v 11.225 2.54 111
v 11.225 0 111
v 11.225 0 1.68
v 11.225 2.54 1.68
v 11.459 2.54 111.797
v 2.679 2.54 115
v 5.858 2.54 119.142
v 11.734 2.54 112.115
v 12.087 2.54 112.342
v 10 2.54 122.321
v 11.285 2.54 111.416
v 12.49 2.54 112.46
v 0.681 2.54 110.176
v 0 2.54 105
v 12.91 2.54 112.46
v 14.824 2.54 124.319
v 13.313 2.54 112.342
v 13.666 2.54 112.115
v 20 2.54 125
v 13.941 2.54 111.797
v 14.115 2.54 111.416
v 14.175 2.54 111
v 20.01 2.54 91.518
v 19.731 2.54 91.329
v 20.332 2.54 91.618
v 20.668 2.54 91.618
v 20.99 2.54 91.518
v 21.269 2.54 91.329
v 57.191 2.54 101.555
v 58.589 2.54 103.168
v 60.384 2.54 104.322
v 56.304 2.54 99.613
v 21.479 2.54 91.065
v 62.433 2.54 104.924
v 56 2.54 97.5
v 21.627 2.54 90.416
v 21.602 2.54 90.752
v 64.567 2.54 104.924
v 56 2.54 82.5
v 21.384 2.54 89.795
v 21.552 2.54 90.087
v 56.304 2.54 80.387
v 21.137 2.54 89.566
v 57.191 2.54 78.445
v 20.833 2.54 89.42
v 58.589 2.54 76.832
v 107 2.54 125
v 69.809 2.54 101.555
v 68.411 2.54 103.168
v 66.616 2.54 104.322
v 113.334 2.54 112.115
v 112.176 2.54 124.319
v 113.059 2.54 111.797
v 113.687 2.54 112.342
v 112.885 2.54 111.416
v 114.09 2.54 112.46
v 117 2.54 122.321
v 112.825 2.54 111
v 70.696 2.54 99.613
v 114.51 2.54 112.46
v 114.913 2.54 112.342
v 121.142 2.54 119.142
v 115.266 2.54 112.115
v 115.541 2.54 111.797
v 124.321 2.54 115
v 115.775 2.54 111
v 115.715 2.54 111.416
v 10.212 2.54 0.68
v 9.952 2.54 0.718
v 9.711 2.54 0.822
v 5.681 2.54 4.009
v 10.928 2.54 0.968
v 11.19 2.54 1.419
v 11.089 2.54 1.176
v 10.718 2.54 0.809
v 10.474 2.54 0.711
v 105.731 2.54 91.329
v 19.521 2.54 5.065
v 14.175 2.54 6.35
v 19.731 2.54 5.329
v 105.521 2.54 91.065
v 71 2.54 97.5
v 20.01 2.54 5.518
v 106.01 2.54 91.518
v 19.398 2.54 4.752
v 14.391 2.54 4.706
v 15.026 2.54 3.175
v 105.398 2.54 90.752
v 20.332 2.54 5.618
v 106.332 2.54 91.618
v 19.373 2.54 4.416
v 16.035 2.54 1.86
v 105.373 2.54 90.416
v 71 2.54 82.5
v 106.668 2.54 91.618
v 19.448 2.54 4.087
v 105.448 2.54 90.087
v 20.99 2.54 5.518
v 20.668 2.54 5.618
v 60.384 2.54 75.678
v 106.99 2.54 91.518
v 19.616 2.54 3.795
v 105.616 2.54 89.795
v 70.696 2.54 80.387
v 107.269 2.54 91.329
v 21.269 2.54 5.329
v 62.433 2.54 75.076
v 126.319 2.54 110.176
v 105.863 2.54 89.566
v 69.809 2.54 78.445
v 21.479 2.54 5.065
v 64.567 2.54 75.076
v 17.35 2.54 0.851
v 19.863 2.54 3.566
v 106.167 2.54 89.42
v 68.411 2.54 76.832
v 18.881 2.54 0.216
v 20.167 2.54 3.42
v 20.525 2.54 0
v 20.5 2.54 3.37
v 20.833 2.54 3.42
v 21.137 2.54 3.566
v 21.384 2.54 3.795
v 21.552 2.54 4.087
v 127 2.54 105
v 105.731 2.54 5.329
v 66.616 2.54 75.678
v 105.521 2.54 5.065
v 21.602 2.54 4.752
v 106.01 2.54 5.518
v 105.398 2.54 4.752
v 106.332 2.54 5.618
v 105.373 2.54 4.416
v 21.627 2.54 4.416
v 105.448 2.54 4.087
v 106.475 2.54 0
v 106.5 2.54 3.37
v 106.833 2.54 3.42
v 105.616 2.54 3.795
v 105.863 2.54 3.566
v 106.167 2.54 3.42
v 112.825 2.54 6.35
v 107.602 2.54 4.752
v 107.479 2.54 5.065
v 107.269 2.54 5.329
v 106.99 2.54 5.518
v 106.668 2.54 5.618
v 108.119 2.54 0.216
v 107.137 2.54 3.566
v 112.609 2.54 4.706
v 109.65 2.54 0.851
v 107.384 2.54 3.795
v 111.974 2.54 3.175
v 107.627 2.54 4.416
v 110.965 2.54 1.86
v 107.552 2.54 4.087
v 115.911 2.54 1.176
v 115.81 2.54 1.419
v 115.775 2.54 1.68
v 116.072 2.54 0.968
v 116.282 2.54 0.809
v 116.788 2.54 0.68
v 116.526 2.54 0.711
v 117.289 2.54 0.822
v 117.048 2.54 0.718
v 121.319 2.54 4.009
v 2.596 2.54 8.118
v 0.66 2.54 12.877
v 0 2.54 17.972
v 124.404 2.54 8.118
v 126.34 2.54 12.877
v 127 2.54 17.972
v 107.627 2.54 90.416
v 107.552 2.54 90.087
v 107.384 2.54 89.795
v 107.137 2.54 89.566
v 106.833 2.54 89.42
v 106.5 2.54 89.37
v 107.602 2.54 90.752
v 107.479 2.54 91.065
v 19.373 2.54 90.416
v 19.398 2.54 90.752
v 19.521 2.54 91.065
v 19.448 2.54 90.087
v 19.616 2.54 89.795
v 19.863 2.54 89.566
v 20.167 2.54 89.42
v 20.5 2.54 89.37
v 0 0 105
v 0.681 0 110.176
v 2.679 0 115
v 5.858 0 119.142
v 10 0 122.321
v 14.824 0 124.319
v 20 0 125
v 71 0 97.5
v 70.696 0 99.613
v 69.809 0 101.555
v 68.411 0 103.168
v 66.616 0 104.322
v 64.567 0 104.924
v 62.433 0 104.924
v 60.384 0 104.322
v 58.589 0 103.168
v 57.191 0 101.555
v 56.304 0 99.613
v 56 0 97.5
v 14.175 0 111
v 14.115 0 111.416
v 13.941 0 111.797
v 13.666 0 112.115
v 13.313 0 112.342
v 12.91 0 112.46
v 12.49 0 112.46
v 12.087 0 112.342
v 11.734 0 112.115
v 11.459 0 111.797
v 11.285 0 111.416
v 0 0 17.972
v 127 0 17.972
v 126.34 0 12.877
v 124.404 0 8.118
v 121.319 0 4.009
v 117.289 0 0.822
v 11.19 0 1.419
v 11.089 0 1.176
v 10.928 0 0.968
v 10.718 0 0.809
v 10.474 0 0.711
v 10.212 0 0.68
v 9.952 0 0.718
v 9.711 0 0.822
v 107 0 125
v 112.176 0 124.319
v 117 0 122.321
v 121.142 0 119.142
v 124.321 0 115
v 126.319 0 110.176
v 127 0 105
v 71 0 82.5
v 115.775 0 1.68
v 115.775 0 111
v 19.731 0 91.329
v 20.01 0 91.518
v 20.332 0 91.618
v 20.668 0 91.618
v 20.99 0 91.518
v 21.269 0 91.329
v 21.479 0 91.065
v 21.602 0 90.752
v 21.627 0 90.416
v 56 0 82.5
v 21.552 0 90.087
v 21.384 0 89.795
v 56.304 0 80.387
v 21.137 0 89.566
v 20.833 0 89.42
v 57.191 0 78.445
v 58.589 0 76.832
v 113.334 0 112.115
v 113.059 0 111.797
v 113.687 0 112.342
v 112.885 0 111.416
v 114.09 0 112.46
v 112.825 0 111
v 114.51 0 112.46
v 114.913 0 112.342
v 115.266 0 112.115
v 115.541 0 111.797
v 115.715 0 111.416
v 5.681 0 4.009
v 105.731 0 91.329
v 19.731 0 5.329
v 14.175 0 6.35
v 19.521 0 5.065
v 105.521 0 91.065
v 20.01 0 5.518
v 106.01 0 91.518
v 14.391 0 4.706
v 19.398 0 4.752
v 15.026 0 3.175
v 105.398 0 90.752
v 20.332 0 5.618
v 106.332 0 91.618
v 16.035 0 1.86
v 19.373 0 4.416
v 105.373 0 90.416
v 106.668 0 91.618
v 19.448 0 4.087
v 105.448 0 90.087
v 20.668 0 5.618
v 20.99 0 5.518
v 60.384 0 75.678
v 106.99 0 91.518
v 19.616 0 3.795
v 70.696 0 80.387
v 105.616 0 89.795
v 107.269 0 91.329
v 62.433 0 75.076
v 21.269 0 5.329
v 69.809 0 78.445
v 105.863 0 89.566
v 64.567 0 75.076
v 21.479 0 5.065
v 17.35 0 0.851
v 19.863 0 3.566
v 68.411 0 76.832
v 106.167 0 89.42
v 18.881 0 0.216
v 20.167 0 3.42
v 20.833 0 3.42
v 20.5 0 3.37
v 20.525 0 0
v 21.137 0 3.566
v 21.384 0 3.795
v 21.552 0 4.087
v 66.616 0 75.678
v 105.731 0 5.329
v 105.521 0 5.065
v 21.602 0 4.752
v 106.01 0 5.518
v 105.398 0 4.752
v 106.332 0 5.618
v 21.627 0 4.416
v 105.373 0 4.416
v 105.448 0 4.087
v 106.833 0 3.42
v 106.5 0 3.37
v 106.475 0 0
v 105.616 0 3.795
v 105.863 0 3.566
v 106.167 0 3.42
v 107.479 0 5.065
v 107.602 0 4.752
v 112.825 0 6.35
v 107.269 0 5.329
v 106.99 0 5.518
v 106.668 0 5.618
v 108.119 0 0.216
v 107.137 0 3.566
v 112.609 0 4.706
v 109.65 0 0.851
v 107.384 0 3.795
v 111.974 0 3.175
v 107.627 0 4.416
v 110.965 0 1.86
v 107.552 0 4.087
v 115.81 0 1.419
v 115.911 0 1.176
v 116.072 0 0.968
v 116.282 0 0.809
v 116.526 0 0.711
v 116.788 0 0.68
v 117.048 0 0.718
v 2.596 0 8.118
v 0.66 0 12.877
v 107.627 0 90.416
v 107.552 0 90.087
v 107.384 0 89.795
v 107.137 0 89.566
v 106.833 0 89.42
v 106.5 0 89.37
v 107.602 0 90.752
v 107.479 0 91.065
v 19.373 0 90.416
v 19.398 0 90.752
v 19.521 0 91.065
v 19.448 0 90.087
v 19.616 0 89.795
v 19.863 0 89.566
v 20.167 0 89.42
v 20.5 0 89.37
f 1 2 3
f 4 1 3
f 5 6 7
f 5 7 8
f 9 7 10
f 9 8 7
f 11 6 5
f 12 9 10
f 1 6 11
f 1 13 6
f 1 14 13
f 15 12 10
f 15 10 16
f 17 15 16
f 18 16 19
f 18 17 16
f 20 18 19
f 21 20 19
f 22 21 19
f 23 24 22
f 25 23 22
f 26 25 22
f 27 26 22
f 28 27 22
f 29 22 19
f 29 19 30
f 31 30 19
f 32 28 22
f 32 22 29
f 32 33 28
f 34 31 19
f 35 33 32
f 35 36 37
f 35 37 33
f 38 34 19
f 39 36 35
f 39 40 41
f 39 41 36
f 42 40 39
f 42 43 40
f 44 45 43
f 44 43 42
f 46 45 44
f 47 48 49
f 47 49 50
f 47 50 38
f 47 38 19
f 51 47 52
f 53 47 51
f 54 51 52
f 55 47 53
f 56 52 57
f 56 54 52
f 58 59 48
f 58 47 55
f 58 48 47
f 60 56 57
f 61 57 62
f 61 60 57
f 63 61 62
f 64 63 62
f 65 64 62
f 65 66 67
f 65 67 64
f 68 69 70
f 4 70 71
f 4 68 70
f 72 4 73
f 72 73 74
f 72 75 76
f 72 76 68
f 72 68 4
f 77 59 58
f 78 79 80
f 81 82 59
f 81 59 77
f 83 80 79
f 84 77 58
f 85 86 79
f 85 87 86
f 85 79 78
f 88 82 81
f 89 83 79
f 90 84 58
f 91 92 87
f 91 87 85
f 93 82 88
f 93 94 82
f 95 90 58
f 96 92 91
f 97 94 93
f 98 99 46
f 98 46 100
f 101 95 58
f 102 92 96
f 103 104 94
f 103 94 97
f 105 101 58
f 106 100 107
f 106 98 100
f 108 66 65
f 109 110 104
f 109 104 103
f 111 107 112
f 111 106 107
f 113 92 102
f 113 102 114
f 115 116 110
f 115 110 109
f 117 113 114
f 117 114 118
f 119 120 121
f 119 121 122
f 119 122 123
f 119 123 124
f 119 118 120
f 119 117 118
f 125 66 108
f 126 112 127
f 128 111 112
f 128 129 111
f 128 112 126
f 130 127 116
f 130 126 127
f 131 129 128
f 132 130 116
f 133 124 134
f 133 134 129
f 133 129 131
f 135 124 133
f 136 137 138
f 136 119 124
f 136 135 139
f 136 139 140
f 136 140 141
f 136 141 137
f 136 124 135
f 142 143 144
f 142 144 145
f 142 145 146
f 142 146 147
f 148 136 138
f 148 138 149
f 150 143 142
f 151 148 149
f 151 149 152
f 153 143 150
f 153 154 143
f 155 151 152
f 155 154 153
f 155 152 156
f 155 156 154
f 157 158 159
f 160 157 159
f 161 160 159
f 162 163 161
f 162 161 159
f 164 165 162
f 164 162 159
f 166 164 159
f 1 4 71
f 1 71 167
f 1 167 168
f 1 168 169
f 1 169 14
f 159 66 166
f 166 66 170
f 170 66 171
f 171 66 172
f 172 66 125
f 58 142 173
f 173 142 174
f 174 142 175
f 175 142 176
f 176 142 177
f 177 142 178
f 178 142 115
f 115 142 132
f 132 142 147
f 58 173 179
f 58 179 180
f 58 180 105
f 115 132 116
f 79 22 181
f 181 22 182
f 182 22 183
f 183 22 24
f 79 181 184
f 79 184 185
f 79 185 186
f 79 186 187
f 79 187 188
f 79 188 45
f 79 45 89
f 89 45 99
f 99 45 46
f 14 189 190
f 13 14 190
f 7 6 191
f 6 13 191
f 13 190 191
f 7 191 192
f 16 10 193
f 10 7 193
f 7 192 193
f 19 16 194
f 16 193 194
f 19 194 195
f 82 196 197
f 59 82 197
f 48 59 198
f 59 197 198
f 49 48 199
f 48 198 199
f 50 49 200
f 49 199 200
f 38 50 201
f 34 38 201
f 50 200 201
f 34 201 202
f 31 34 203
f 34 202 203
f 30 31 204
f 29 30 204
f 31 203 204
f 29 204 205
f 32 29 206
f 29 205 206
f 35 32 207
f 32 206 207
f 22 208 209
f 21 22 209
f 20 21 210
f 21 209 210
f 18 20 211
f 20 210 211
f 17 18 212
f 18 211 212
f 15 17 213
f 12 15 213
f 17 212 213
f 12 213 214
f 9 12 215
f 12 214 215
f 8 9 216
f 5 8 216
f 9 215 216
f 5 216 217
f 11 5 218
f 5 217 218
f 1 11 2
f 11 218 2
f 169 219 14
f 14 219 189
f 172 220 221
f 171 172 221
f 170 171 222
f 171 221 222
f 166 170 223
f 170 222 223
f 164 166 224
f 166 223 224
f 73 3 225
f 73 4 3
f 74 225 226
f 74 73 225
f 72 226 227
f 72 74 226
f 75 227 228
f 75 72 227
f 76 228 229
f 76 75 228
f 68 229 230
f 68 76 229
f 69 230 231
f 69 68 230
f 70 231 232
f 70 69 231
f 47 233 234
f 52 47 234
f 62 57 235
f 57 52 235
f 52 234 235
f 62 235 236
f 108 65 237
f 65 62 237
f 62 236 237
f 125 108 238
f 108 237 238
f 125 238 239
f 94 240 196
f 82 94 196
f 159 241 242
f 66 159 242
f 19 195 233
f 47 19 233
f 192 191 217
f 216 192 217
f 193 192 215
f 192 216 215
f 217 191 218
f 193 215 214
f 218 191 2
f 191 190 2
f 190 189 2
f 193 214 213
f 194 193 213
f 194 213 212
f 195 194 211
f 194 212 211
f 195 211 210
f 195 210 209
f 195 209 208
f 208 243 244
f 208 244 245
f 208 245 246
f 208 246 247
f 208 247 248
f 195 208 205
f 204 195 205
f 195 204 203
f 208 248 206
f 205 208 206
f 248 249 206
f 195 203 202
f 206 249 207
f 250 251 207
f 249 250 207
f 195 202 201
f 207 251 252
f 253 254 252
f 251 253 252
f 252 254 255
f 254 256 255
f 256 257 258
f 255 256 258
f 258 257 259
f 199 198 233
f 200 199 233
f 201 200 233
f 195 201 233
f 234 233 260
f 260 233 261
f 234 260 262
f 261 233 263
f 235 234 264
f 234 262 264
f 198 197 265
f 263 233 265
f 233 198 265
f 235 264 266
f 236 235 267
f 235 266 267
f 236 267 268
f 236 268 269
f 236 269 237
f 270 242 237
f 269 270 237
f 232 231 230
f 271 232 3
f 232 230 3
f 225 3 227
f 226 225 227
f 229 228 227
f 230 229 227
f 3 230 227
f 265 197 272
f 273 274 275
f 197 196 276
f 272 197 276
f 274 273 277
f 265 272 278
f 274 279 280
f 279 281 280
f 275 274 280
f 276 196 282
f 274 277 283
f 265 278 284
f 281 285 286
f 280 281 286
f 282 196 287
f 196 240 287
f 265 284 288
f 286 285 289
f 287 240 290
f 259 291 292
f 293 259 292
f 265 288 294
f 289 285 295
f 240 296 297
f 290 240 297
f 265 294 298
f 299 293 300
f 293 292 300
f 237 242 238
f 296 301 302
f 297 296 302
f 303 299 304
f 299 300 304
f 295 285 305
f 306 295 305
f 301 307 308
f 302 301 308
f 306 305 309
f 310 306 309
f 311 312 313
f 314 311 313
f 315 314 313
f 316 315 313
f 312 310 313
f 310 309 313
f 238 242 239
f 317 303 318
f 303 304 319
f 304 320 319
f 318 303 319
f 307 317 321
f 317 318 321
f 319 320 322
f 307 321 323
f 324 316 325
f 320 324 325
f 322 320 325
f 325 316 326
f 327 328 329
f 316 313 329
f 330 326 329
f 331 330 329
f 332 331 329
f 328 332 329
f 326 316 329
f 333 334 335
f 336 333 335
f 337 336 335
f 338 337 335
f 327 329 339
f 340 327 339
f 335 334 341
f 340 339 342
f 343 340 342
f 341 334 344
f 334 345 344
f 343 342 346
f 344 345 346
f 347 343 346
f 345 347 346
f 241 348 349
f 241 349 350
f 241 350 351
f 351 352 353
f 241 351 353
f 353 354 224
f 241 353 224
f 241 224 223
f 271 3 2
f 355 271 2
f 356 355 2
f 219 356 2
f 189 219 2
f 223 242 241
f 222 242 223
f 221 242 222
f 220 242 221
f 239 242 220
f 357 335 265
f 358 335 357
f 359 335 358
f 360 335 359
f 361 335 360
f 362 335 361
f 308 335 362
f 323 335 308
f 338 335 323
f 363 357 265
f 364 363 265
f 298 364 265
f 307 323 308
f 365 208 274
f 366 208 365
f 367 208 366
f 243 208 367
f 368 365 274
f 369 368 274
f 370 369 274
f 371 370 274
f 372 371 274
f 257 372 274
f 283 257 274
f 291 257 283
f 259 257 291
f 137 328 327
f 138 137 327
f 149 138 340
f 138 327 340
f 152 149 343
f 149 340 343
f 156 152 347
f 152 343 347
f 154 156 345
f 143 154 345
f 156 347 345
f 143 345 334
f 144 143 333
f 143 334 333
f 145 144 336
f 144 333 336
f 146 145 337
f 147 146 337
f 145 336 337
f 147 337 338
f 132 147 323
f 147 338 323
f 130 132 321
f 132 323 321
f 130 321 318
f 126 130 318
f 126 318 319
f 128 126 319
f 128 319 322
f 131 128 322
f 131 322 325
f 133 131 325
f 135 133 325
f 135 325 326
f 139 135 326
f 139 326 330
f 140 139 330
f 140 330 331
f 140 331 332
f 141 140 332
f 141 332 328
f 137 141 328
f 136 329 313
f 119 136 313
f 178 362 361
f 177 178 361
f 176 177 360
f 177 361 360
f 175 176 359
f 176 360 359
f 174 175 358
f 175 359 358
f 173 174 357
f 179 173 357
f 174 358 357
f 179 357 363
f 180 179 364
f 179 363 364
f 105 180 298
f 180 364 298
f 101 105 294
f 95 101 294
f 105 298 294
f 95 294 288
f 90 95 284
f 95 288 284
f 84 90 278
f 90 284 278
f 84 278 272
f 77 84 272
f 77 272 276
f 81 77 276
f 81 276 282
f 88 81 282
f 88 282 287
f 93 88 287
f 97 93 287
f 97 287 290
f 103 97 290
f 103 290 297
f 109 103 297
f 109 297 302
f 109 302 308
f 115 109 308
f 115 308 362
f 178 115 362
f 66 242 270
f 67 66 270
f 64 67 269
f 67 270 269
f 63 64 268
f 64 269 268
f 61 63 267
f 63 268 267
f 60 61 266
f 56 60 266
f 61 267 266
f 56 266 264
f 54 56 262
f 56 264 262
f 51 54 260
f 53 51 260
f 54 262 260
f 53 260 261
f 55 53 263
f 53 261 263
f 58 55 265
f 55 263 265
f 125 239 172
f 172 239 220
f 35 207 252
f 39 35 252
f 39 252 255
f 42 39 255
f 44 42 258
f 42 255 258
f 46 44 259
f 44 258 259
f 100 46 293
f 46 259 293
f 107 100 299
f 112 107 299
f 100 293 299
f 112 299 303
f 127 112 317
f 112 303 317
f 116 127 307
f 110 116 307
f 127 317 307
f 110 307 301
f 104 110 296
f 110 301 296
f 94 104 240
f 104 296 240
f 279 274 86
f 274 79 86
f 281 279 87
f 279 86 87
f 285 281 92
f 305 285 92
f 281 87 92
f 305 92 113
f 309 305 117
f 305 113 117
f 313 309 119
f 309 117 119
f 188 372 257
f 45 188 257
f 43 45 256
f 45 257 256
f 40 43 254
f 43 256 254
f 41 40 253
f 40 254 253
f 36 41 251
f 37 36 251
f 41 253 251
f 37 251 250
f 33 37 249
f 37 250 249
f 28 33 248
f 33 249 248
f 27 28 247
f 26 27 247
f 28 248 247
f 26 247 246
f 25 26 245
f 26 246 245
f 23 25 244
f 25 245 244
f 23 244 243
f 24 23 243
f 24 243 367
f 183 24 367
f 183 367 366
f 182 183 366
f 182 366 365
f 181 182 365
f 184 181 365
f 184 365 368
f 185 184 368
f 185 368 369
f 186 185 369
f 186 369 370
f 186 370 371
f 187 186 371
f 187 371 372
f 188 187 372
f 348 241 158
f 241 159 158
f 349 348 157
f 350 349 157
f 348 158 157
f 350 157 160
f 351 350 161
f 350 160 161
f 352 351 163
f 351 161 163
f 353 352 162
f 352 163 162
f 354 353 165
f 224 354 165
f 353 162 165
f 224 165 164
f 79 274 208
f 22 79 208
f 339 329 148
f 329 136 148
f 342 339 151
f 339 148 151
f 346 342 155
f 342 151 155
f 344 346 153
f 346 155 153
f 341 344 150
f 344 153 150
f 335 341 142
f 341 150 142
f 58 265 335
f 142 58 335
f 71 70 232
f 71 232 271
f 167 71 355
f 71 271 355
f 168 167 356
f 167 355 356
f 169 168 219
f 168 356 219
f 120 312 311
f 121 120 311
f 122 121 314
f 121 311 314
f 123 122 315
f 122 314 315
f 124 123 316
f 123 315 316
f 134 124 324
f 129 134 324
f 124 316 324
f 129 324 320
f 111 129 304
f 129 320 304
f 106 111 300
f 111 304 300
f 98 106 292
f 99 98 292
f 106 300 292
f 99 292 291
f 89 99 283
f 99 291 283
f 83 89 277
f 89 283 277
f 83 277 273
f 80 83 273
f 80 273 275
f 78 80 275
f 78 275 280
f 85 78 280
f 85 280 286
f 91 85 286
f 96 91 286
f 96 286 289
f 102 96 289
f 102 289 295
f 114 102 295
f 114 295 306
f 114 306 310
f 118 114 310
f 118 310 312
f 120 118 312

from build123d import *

# Parameters (mm, degrees)
SKETCH1_R             = 1.13
BOSS_EXTRUDE1_DEPTH   = 2.54
FILLET1_R             = 20
FILLET6_R             = 6.35
FILLET7_R             = 1
F_4_40_TAPPED_HOLE1_D = 2.2606


with BuildPart() as part:
    # Sketch1 → Boss-Extrude1 (new body)
    with BuildSketch(Plane(origin=(0, 0, 0), x_dir=(1, 0, 0), z_dir=(0, 1, 0))):
        with BuildLine():
            Line((11.225, 0), (0, 0))
            Line((0, 0), (0, -125))
            Line((0, -125), (127, -125))
            Line((127, -125), (127, 0))
            Line((127, 0), (115.775, 0))
            Line((115.775, 0), (115.775, -111))
            ThreePointArc((115.775, -111), (114.3, -112.475), (112.825, -111))
            Line((112.825, -111), (112.825, 0))
            Line((112.825, 0), (14.175, 0))
            Line((14.175, 0), (14.175, -111))
            ThreePointArc((14.175, -111), (12.7, -112.475), (11.225, -111))
            Line((11.225, -111), (11.225, 0))
        make_face()
        with BuildLine():
            ThreePointArc((71, -97.5), (63.5, -105), (56, -97.5))
            Line((56, -97.5), (56, -82.5))
            ThreePointArc((56, -82.5), (63.5, -75), (71, -82.5))
            Line((71, -82.5), (71, -97.5))
        make_face(mode=Mode.SUBTRACT)
        with Locations(Location((106.5, -4.5, 0), (0, 0, 270))):
            Circle(SKETCH1_R, mode=Mode.SUBTRACT)
        with Locations(Location((20.5, -90.5, 0), (0, 0, 270))):
            Circle(SKETCH1_R, mode=Mode.SUBTRACT)
        with Locations(Location((106.5, -90.5, 0), (0, 0, 270))):
            Circle(SKETCH1_R, mode=Mode.SUBTRACT)
        with Locations(Location((20.5, -4.5, 0), (0, 0, 270))):
            Circle(SKETCH1_R, mode=Mode.SUBTRACT)
    extrude(amount=BOSS_EXTRUDE1_DEPTH)

    # Fillet1
    # the kernel refuses this fillet: 20 mm, written as the material it takes off along each edge
    with BuildSketch(Plane(origin=(0, -44.930458419, 0), x_dir=(1, 0, 0), z_dir=(0, 1, 0))) as fillet1_piece_1:
        with BuildLine():
            CenterArc((20, -17.972183368), FILLET1_R, 116.024153389, 63.975846611)
            Line((0, -17.972183368), (-0.4, -17.972183368))
            Line((-0.4, -17.972183368), (-0.4, 0))
            Line((-0.4, 0), (0, 0.4))
            ThreePointArc((0, 0.4), (5.6125, 0.4), (11.0495, 0.359443667))
            Line((11.0495, 0.359443667), (11.225, 0))
        make_face()
    extrude(amount=92.400916838, mode=Mode.SUBTRACT)
    with BuildSketch(Plane(origin=(127, -44.930458419, 0), x_dir=(0, 0, 1), z_dir=(0, 1, 0))) as fillet1_piece_2:
        with BuildLine():
            CenterArc((17.972183368, -20), FILLET1_R, 90, 63.975846611)
            Line((0, -11.225), (-0.359443667, -11.0495))
            ThreePointArc((-0.359443667, -11.0495), (-0.4, -5.6125), (-0.4, 0))
            Line((-0.4, 0), (0, 0.4))
            Line((0, 0.4), (17.972183368, 0.4))
            Line((17.972183368, 0.4), (17.972183368, 0))
        make_face()
    extrude(amount=92.400916838, mode=Mode.SUBTRACT)
    with BuildSketch(Plane(origin=(127, -50, 125), x_dir=(-1, 0, 0), z_dir=(0, 1, 0)), Plane(origin=(0, -50, 125), x_dir=(0, 0, -1), z_dir=(0, 1, 0))) as fillet1_piece_3:
        with BuildLine():
            CenterArc((FILLET1_R, -FILLET1_R), FILLET1_R, 90, 90)
            Line((0, -FILLET1_R), (-FILLET1_R * 0.02, -FILLET1_R))
            Line((-FILLET1_R * 0.02, -FILLET1_R), (-FILLET1_R * 0.02, FILLET1_R * 0.02))
            Line((-FILLET1_R * 0.02, FILLET1_R * 0.02), (FILLET1_R, FILLET1_R * 0.02))
            Line((FILLET1_R, FILLET1_R * 0.02), (FILLET1_R, 0))
        make_face()
    extrude(amount=102.54, mode=Mode.SUBTRACT)

    # Fillet6
    fillet6_edges = [part.edges().sort_by_distance(p)[0] for p in [
        (112.825, 1.27, 0),
        (14.175, 1.27, 0),
    ]]
    fillet(fillet6_edges, radius=FILLET6_R)

    # Fillet7
    fillet7_edges = [part.edges().sort_by_distance(p)[0] for p in [
        (115.775, 1.27, 0),
        (11.225, 1.27, 0),
    ]]
    fillet(fillet7_edges, radius=FILLET7_R)

    # #4-40 Tapped Hole1 (through all)
    with Locations(Plane(origin=(106.5, 2.54, 4.5), x_dir=(0, 0, 1), z_dir=(0, 1, 0))):
        with Locations((0, 0), (0, -86), (86, 0), (86, -86)):
            Hole(F_4_40_TAPPED_HOLE1_D / 2)


solid = part.part
